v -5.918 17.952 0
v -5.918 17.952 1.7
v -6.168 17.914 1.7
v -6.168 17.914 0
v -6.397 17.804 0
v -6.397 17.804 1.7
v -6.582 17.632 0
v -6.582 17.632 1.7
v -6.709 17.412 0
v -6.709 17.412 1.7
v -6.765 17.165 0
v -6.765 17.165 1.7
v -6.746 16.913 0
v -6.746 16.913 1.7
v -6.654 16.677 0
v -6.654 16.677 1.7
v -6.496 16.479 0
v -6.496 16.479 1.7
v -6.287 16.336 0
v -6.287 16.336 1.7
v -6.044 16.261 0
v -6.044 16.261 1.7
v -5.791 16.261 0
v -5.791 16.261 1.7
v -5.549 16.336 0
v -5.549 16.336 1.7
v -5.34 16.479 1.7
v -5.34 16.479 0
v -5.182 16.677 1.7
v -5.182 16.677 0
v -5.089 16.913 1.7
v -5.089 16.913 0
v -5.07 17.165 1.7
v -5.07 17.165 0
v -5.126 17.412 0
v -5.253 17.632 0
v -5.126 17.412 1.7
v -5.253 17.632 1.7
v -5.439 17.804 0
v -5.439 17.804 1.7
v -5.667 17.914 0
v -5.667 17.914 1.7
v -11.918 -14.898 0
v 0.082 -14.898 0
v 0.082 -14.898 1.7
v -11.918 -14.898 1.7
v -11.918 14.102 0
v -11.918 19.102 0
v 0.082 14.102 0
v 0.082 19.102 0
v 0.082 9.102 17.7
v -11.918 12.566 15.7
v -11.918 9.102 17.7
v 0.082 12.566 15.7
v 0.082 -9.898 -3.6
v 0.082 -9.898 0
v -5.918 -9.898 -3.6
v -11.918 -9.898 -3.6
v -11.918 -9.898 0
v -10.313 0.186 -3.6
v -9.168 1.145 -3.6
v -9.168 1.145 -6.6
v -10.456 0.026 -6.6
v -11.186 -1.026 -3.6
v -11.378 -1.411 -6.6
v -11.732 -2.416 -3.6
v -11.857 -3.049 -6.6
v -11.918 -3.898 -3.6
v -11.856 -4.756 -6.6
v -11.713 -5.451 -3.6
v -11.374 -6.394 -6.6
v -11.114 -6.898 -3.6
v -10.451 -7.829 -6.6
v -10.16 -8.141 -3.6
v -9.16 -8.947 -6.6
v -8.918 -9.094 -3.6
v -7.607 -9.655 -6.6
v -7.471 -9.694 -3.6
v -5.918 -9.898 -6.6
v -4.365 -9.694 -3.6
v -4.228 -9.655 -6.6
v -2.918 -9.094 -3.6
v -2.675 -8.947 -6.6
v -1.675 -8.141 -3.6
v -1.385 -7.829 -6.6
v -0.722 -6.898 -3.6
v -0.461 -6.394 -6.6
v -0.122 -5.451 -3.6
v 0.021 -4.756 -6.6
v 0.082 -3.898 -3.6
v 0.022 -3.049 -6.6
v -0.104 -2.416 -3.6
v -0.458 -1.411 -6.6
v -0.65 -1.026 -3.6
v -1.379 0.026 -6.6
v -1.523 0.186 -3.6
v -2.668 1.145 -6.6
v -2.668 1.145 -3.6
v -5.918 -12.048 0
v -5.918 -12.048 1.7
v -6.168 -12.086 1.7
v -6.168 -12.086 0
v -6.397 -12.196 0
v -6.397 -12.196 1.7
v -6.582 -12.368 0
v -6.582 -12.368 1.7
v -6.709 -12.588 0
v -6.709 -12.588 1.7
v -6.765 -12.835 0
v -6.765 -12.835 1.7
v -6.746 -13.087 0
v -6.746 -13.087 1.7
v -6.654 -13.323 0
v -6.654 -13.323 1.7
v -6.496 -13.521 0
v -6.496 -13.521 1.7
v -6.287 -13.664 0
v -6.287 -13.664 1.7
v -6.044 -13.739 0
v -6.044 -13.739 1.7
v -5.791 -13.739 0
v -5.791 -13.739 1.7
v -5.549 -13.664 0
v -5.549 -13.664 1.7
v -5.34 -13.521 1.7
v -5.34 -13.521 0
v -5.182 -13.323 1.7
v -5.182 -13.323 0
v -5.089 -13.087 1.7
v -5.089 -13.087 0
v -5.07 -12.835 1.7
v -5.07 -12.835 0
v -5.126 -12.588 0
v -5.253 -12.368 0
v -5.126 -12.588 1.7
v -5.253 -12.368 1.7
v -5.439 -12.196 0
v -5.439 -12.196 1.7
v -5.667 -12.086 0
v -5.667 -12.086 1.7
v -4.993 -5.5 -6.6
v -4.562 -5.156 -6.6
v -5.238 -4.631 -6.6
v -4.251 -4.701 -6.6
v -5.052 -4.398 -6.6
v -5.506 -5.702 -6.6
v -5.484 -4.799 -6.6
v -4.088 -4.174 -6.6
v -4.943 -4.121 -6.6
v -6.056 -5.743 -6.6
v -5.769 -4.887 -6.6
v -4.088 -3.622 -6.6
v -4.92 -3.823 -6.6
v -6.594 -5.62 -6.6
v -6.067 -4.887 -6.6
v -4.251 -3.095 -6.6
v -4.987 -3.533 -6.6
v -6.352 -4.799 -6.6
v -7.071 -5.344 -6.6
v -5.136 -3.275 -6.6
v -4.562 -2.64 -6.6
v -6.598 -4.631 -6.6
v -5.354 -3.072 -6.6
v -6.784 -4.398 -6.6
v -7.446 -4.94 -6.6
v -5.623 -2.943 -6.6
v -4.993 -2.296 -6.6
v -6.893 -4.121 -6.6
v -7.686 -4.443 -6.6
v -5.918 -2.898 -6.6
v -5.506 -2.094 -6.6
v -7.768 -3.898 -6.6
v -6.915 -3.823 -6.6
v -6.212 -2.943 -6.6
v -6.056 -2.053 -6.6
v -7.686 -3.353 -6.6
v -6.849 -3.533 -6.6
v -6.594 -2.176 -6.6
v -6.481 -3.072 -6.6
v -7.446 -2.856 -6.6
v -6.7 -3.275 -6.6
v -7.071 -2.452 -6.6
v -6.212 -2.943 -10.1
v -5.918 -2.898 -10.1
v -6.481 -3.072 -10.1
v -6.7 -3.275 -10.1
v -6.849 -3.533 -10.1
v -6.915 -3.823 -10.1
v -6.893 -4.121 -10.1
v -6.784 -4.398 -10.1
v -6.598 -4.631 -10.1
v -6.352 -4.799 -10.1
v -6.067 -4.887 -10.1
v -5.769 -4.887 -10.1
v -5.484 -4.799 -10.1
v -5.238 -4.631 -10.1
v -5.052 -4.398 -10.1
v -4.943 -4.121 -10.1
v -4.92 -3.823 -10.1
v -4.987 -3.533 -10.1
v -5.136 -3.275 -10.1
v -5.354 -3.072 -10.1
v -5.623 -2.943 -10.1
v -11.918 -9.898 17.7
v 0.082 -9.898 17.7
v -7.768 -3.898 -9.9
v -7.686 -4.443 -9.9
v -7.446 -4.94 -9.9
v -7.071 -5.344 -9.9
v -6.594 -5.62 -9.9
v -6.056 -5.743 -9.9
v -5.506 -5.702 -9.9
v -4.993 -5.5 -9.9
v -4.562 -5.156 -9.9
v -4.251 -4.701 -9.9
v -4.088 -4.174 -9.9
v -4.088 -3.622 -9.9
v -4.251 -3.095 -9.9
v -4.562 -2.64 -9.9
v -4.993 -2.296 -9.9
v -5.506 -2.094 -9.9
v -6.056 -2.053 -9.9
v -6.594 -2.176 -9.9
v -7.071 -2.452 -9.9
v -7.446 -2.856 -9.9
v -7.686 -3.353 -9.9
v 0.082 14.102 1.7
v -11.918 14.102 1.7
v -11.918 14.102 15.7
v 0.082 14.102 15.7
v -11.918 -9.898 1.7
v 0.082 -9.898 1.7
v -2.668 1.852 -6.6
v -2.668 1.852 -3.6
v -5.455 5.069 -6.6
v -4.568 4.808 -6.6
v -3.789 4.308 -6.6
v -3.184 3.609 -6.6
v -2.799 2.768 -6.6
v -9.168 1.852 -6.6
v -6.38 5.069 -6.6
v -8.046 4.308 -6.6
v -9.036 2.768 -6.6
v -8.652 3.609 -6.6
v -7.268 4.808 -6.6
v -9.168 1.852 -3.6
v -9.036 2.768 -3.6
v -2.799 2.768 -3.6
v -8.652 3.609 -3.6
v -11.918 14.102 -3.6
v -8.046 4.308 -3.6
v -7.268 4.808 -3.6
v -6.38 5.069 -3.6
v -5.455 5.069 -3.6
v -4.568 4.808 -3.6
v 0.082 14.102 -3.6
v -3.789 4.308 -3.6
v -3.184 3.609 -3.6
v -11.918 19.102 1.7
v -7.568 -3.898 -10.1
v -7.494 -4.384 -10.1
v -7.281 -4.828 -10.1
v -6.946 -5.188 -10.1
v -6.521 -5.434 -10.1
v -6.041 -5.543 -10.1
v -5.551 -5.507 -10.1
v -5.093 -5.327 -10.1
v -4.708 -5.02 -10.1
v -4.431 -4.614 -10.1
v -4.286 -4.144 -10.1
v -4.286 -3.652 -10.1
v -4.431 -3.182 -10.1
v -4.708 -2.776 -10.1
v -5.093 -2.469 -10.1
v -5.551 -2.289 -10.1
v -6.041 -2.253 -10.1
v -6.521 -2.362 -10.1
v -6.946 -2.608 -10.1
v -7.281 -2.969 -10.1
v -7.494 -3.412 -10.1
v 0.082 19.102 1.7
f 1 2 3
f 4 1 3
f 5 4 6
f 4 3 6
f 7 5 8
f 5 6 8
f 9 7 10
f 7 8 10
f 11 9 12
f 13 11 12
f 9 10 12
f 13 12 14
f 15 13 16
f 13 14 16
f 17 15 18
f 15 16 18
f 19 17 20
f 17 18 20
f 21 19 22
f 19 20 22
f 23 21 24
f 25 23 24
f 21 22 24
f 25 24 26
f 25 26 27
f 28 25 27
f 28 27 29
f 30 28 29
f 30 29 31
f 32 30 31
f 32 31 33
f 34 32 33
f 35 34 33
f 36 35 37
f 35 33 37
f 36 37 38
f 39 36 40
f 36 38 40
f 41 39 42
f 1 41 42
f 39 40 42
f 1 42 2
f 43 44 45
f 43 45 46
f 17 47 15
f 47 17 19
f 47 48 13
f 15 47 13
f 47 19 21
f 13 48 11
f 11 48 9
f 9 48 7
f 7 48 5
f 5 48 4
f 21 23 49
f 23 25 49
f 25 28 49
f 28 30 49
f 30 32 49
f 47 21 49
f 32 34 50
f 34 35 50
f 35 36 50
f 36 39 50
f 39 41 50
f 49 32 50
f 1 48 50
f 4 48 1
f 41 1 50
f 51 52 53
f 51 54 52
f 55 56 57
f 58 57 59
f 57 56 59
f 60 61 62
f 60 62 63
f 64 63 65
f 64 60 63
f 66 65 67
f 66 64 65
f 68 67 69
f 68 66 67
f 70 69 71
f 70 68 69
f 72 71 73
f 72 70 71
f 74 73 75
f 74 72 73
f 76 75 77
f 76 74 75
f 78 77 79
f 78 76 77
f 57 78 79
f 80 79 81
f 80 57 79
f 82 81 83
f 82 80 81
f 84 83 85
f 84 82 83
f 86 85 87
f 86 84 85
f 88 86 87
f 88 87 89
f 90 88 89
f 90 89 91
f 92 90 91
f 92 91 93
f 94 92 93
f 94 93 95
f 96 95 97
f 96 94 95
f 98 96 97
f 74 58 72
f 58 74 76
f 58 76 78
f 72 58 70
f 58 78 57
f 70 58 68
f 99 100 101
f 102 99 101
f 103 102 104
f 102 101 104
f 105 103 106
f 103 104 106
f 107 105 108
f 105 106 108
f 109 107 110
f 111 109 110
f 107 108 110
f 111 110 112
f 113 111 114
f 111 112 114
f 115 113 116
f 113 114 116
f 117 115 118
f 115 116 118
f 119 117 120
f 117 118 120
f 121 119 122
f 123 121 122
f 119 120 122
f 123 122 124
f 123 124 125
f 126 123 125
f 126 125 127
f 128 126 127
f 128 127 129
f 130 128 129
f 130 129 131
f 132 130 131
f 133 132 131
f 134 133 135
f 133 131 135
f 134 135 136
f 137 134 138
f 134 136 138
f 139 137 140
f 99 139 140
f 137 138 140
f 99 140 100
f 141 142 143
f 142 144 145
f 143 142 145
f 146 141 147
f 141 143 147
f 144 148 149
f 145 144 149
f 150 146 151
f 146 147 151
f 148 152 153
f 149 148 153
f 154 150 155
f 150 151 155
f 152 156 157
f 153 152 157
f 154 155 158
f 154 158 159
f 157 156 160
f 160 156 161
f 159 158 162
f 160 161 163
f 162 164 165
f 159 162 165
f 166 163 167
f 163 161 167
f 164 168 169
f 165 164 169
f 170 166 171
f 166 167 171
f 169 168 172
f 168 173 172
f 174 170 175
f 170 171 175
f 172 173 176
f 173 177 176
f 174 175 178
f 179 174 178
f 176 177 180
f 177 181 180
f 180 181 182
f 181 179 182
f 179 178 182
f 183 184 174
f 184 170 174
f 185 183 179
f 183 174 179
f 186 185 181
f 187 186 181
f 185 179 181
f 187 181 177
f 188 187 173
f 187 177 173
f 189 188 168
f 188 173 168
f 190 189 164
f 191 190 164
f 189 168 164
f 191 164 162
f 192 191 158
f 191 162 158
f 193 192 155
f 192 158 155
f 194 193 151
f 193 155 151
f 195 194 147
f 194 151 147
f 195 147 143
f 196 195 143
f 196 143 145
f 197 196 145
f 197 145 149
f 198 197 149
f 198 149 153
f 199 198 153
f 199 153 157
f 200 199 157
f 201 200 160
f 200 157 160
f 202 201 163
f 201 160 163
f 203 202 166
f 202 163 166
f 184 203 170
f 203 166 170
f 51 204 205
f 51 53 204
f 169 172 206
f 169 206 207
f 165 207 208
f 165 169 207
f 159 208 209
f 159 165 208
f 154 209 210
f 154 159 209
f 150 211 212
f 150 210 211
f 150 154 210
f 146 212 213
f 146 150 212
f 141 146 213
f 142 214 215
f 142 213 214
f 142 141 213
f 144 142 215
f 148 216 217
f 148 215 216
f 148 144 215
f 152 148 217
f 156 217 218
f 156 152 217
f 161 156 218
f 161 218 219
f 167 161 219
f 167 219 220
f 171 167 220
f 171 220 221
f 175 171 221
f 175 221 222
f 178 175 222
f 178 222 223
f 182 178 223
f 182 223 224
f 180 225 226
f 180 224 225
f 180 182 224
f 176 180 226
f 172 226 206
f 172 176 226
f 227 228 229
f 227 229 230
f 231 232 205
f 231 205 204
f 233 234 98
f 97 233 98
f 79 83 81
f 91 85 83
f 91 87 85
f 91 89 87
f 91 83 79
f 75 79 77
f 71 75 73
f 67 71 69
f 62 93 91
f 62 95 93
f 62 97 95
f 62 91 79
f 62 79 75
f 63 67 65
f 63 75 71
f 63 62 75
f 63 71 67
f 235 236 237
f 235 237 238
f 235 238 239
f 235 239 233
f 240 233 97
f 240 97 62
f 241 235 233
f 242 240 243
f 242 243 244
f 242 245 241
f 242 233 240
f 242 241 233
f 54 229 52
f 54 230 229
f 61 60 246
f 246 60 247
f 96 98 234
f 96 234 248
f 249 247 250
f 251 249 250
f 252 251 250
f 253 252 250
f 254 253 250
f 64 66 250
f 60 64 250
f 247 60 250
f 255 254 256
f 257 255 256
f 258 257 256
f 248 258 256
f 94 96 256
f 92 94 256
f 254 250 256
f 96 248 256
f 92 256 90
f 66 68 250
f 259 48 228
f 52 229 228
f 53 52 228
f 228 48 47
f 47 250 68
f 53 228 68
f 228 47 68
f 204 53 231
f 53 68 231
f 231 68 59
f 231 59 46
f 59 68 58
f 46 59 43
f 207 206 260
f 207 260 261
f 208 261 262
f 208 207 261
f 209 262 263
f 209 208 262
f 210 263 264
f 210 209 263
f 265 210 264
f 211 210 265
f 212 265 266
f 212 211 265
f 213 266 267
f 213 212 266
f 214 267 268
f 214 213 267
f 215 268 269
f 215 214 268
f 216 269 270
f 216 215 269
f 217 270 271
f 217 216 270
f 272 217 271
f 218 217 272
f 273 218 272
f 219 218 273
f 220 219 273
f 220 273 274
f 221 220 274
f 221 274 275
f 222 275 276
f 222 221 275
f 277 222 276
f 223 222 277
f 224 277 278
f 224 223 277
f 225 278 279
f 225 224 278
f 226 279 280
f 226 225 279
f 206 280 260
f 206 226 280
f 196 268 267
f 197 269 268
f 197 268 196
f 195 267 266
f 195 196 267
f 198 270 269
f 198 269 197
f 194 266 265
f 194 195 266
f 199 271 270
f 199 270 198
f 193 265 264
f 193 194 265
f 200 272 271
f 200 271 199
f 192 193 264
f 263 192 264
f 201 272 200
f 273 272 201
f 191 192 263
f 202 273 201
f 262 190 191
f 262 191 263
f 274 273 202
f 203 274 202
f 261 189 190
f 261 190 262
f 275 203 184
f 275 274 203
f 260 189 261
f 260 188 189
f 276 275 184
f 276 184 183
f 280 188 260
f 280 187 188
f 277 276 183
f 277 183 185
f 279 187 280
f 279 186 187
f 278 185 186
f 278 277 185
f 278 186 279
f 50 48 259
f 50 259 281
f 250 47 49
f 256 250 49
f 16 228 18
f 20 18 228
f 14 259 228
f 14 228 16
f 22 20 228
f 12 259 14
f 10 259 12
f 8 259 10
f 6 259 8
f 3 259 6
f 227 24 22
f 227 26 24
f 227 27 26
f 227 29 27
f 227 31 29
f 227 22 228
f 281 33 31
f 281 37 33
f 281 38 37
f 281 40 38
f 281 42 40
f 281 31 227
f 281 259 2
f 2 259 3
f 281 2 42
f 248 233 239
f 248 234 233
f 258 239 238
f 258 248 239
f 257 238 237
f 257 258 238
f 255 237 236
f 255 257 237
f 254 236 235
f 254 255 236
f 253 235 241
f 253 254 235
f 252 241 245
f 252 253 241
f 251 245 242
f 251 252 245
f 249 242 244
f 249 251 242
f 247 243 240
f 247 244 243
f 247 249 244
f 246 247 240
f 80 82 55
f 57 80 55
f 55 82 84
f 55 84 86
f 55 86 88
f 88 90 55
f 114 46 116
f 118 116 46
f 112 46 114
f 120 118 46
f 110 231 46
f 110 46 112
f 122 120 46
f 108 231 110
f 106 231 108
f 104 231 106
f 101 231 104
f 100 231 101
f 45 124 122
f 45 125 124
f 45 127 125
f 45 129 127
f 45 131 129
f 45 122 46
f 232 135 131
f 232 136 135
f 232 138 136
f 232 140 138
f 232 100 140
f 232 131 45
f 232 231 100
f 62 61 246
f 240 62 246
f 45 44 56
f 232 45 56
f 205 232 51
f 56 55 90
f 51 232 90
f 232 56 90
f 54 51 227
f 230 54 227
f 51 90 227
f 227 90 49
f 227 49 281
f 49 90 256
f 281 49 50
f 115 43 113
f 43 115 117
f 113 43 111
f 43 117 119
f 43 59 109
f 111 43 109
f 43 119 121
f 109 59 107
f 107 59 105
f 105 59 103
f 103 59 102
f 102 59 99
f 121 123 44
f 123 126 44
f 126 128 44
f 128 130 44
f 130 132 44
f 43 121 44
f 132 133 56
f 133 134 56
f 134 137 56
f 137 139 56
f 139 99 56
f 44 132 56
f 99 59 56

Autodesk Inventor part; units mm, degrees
ref_plane "YZ Plane" through (0, 0, 0) normal (1, 0, 0) x (0, 1, 0)
ref_plane "XZ Plane" through (0, 0, 0) normal (0, 1, 0) x (-1, 0, 0)
ref_plane "XY Plane" through (0, 0, 0) normal (0, 0, 1) x (1, 0, 0)
sketch "Skizze1" plane through (0, 0, 0) normal (0, 0, 1) x (1, 0, 0)
  line L0 (0.0823, -4.147) -> (0.0823, -9.8981)
  line L1 (0.0823, -9.8981) -> (-11.9177, -9.8981)
  line L2 (-11.9177, -9.8981) -> (-11.9177, 14.1019)
  line L3 (-11.9177, 14.1019) -> (0.0823, 14.1019)
  line L4 (0.0823, 14.1019) -> (0.0823, -4.147)
  point P0 (0, 0)
  dimension "d34" = 12
  dimension "d35" = 24
extrude "Extrusion1" add sketch "Skizze1" against normal blind 3.6
sketch "Skizze2" plane through (0, 0, 0) normal (0, 0, 1) x (1, 0, 0)
  line L0 (0.0823, -9.8981) -> (0.0823, 14.1019) projected
  line L1 (0.0823, 14.1019) -> (-11.9177, 14.1019) projected
  line L2 (-11.9177, 14.1019) -> (-11.9177, -9.8981) projected
  line L3 (-11.9177, -9.8981) -> (0.0823, -9.8981) projected
  line L4 (-11.9177, 19.1019) -> (0.0823, 19.1019)
  line L5 (0.0823, 19.1019) -> (0.0823, -14.8981)
  line L6 (0.0823, -14.8981) -> (-11.9177, -14.8981)
  line L7 (-11.9177, -14.8981) -> (-11.9177, 19.1019)
  point P0 (0, 0)
  dimension "d2" = 5
  dimension "d3" = 5
extrude "Extrusion2" add sketch "Skizze2" along normal blind 1.7
sketch "Skizze3" plane through (0, 0, 1.7) normal (0, 0, 1) x (1, 0, 0)
  line L0 (0.0823, 14.1019) -> (0.0823, -9.8981) projected
  line L1 (0.0823, -9.8981) -> (-11.9177, -9.8981) projected
  line L2 (-11.9177, -9.8981) -> (-11.9177, 14.1019) projected
  line L3 (-11.9177, 14.1019) -> (0.0823, 14.1019) projected
  point P0 (0, 0)
extrude "Extrusion3" add sketch "Skizze3" along normal blind 16
sketch "Skizze4" plane through (0, 0, -3.6) normal (0, 0, -1) x (-1, 0, 0)
  line L0 (-0.0823, -9.8981) -> (11.9177, -9.8981) projected
  line L1 (11.9177, 14.1019) -> (-0.0823, 14.1019) projected
  circle A0 centre (5.9177, -3.8981) radius 6
  line L2 (5.9177, 14.1019) -> (5.9177, -9.8981) construction
  line L3 (5.9177, -3.8981) -> (5.9177, 1.8519) construction
  line L4 (9.1677, -3.8981) -> (9.1677, 1.8519)
  line L5 (2.6677, 1.8519) -> (2.6677, -3.8981)
  arc A1 (2.6677, -3.8981) -> (9.1677, -3.8981) centre (5.9177, -3.8981) ccw
  arc A2 (9.1677, 1.8519) -> (2.6677, 1.8519) centre (5.9177, 1.8519) ccw
  line L6 (-0.0823, 14.1019) -> (-0.0823, -9.8981) projected
  point P0 (0, 0)
  point P1 (5.9177, -1.0231)
  dimension "d32" = 6.5
  dimension "d33" = 15
extrude "Extrusion4" add sketch "Skizze4" along normal blind 3 contours A0 L5 A1 L4 | L5 A2 L4 A0 | A0 L4 A1 L5
sketch "Skizze5" plane through (0, 0, -3.6) normal (0, 0, -1) x (-1, 0, 0)
  circle A0 centre (5.9177, -3.8981) radius 6 projected
  line L0 (-0.0823, 14.1019) -> (-0.0823, -9.8981) projected
  line L1 (-0.0823, -9.8981) -> (11.9177, -9.8981) projected
  line L2 (11.9177, -9.8981) -> (11.9177, 14.1019) projected
  line L3 (11.9177, 14.1019) -> (-0.0823, 14.1019) projected
  point P0 (0, 0)
sketch "Skizze7" plane through (0, 0, 0) normal (0, 0, -1) x (-1, 0, 0)
  line L0 (-0.0823, -9.8981) -> (-0.0823, -14.8981) projected
  line L1 (-0.0823, -14.8981) -> (11.9177, -14.8981) projected
  line L2 (-0.0823, 14.1019) -> (11.9177, 14.1019) projected
  line L3 (11.9177, 14.1019) -> (11.9177, 19.1019) projected
  line L4 (11.9177, 19.1019) -> (-0.0823, 19.1019) projected
  line L5 (-0.0823, 19.1019) -> (-0.0823, 14.1019) projected
  point P0 (0, 0)
  point P1 (5.9177, 17.1019)
  point P2 (5.9177, -12.8981)
  dimension "d12" = 2
  dimension "d13" = 2
  dimension "d14" = 12
  dimension "d15" = 6
  dimension "d16" = 6
hole "Bohrung1" at (-5.9177, -12.8981, 0) at (-5.9177, 17.1019, 0) direction (0, 0, 1) diameter 1.7 end through all
sketch "Skizze9" plane through (0, 0, -6.6) normal (0, 0, -1) x (-1, 0, 0)
  arc A0 (2.6677, 1.1454) -> (9.1677, 1.1454) centre (5.9177, -3.8981) ccw projected
  circle A1 centre (5.9177, -3.8981) radius 1.85
  point P0 (0, 0)
  dimension "d36" = 3.7
extrude "Extrusion6" add sketch "Skizze9" along normal blind 3.5 separate body
chamfer "Fase1" distance 0.2 angle 45 1 edges at (-4.0677, -3.8981, -10.1)
sketch "Skizze10" plane through (0.0823, 14.1019, 0) normal (1, 0, 0) x (0, 0, -1)
  line L0 (-1.7, 0) -> (-17.7, 0) projected
  line L1 (-17.7, -24) -> (-17.7, 0) projected
  line L2 (0, -24) -> (0, -29) projected
  line L3 (-15.7, 0) -> (-15.7, -1.5359)
  line L4 (-15.7, -1.5359) -> (-17.7, -5)
  point P0 (0, -14.1019)
  dimension "d42" = 30
  dimension "d43" = 2
  dimension "d44" = 5
extrude "Extrusion7" cut sketch "Skizze10" against normal through all bodies 1
hole "Bohrung2" at (-5.9177, -3.8981, -10.1) direction (0, 0, 1) diameter 2 depth 5 tip angle 118 bodies 2
equation "\"d15\" = 0.5 * d14"
equation "\"d16\" = d15"
properties part number "Servo G12DM" material "ABS-Kunststoff - Schwarz"
